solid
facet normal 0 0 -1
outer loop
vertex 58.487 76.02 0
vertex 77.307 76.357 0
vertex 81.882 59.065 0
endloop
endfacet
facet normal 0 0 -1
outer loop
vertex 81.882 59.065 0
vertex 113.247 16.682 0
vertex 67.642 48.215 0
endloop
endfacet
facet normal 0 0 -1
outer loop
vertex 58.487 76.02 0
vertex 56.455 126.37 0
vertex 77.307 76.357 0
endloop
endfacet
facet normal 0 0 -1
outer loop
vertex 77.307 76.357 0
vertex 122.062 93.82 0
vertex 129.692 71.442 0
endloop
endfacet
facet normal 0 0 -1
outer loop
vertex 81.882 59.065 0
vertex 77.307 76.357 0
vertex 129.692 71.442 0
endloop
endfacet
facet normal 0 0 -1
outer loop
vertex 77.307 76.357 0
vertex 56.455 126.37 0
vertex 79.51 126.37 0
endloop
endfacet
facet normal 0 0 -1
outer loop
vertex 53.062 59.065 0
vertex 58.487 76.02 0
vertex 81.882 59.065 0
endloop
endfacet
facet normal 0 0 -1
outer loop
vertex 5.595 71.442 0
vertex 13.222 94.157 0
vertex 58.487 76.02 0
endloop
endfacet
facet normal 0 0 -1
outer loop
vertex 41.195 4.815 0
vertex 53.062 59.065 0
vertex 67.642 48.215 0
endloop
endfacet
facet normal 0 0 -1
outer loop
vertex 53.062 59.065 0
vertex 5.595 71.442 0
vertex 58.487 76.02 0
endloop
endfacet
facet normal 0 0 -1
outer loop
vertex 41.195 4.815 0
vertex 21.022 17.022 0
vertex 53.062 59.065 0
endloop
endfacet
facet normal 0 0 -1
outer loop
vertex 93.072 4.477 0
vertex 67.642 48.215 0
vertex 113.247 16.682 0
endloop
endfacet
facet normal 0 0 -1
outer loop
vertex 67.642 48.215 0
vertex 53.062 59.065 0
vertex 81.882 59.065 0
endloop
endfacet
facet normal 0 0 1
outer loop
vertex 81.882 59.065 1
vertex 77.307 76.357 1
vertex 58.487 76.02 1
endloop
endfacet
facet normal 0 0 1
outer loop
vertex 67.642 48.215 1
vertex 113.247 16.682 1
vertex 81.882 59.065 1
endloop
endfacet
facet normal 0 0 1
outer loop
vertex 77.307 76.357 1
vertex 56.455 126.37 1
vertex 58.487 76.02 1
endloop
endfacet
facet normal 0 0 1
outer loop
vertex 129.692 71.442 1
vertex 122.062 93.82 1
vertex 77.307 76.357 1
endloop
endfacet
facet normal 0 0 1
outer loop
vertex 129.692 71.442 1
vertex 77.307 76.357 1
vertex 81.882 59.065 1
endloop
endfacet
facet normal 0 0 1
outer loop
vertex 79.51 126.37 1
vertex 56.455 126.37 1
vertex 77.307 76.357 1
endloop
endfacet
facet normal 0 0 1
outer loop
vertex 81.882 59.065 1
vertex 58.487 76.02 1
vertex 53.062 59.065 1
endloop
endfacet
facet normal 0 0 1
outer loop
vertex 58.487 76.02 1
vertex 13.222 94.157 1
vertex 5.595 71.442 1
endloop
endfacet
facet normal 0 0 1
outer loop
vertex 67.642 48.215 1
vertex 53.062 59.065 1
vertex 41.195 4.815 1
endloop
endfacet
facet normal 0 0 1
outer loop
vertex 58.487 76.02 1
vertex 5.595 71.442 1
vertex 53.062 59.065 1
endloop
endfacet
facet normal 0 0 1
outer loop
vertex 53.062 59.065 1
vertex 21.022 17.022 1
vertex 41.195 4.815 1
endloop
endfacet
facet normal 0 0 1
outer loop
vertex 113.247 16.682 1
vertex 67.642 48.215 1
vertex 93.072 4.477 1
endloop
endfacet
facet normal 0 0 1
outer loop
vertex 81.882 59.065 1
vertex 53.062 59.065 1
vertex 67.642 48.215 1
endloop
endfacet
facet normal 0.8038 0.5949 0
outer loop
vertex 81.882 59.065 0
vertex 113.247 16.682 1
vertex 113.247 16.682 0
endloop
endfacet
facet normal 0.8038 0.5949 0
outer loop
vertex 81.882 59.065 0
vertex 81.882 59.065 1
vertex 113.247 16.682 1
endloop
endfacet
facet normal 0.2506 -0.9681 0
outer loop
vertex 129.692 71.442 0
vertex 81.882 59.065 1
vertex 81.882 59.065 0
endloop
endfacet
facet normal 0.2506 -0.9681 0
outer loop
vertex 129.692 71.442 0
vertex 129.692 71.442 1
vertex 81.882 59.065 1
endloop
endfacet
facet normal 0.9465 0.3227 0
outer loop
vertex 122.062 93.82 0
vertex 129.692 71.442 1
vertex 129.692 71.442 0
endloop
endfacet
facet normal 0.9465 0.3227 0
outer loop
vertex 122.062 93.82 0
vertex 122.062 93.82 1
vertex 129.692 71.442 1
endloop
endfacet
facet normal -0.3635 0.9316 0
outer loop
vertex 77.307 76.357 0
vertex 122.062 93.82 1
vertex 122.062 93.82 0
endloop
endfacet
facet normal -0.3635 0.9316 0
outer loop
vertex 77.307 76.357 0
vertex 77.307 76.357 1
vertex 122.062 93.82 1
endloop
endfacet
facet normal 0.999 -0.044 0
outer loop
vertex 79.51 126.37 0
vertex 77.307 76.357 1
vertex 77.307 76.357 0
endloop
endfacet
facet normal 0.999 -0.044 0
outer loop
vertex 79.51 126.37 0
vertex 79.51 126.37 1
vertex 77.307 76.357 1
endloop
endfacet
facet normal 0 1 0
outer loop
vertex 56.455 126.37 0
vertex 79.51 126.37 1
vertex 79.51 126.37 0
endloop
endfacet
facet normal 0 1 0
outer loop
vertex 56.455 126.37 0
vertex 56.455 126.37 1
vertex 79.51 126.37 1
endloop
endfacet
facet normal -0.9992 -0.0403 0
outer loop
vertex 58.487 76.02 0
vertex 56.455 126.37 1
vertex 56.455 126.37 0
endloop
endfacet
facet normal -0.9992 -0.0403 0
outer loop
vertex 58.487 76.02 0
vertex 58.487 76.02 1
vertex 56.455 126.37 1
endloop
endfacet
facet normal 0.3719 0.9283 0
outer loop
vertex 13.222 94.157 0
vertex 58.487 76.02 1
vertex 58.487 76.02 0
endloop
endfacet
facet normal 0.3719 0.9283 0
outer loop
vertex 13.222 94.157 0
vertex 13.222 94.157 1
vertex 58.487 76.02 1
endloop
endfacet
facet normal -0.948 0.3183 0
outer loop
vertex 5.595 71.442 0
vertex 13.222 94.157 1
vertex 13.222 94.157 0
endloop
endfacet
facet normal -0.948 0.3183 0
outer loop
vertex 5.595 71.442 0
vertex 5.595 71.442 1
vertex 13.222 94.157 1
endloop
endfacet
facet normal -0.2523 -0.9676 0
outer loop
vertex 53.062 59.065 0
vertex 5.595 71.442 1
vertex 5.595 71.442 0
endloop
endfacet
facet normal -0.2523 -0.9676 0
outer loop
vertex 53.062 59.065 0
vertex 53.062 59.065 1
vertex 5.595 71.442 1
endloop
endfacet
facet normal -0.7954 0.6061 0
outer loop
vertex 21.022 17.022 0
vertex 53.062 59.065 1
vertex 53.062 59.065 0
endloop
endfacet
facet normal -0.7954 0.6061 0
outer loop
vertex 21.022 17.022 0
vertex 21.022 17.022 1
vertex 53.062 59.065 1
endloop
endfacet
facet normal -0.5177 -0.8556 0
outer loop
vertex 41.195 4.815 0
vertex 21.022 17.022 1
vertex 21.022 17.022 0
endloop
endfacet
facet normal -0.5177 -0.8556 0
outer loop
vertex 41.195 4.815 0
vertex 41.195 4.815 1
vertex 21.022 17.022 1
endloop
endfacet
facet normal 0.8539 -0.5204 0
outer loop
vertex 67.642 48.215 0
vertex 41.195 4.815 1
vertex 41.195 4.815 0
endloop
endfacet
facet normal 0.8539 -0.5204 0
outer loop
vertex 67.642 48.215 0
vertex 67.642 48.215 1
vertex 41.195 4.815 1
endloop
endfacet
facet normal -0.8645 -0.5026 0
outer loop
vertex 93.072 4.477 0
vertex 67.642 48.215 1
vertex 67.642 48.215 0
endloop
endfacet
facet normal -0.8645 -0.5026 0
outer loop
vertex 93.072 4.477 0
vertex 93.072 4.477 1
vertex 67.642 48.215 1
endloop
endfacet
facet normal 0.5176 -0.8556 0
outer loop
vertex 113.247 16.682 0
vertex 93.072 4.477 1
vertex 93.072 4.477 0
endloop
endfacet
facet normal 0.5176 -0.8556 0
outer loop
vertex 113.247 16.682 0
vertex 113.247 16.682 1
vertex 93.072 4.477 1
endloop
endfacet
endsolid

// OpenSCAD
size = 25;
y_pos = -4.5 * size;

translate([0,y_pos,0]) {
    scale([size,size,1]) {
        linear_extrude(height=1) {
            text("*", size=10);
        }
    }
}
